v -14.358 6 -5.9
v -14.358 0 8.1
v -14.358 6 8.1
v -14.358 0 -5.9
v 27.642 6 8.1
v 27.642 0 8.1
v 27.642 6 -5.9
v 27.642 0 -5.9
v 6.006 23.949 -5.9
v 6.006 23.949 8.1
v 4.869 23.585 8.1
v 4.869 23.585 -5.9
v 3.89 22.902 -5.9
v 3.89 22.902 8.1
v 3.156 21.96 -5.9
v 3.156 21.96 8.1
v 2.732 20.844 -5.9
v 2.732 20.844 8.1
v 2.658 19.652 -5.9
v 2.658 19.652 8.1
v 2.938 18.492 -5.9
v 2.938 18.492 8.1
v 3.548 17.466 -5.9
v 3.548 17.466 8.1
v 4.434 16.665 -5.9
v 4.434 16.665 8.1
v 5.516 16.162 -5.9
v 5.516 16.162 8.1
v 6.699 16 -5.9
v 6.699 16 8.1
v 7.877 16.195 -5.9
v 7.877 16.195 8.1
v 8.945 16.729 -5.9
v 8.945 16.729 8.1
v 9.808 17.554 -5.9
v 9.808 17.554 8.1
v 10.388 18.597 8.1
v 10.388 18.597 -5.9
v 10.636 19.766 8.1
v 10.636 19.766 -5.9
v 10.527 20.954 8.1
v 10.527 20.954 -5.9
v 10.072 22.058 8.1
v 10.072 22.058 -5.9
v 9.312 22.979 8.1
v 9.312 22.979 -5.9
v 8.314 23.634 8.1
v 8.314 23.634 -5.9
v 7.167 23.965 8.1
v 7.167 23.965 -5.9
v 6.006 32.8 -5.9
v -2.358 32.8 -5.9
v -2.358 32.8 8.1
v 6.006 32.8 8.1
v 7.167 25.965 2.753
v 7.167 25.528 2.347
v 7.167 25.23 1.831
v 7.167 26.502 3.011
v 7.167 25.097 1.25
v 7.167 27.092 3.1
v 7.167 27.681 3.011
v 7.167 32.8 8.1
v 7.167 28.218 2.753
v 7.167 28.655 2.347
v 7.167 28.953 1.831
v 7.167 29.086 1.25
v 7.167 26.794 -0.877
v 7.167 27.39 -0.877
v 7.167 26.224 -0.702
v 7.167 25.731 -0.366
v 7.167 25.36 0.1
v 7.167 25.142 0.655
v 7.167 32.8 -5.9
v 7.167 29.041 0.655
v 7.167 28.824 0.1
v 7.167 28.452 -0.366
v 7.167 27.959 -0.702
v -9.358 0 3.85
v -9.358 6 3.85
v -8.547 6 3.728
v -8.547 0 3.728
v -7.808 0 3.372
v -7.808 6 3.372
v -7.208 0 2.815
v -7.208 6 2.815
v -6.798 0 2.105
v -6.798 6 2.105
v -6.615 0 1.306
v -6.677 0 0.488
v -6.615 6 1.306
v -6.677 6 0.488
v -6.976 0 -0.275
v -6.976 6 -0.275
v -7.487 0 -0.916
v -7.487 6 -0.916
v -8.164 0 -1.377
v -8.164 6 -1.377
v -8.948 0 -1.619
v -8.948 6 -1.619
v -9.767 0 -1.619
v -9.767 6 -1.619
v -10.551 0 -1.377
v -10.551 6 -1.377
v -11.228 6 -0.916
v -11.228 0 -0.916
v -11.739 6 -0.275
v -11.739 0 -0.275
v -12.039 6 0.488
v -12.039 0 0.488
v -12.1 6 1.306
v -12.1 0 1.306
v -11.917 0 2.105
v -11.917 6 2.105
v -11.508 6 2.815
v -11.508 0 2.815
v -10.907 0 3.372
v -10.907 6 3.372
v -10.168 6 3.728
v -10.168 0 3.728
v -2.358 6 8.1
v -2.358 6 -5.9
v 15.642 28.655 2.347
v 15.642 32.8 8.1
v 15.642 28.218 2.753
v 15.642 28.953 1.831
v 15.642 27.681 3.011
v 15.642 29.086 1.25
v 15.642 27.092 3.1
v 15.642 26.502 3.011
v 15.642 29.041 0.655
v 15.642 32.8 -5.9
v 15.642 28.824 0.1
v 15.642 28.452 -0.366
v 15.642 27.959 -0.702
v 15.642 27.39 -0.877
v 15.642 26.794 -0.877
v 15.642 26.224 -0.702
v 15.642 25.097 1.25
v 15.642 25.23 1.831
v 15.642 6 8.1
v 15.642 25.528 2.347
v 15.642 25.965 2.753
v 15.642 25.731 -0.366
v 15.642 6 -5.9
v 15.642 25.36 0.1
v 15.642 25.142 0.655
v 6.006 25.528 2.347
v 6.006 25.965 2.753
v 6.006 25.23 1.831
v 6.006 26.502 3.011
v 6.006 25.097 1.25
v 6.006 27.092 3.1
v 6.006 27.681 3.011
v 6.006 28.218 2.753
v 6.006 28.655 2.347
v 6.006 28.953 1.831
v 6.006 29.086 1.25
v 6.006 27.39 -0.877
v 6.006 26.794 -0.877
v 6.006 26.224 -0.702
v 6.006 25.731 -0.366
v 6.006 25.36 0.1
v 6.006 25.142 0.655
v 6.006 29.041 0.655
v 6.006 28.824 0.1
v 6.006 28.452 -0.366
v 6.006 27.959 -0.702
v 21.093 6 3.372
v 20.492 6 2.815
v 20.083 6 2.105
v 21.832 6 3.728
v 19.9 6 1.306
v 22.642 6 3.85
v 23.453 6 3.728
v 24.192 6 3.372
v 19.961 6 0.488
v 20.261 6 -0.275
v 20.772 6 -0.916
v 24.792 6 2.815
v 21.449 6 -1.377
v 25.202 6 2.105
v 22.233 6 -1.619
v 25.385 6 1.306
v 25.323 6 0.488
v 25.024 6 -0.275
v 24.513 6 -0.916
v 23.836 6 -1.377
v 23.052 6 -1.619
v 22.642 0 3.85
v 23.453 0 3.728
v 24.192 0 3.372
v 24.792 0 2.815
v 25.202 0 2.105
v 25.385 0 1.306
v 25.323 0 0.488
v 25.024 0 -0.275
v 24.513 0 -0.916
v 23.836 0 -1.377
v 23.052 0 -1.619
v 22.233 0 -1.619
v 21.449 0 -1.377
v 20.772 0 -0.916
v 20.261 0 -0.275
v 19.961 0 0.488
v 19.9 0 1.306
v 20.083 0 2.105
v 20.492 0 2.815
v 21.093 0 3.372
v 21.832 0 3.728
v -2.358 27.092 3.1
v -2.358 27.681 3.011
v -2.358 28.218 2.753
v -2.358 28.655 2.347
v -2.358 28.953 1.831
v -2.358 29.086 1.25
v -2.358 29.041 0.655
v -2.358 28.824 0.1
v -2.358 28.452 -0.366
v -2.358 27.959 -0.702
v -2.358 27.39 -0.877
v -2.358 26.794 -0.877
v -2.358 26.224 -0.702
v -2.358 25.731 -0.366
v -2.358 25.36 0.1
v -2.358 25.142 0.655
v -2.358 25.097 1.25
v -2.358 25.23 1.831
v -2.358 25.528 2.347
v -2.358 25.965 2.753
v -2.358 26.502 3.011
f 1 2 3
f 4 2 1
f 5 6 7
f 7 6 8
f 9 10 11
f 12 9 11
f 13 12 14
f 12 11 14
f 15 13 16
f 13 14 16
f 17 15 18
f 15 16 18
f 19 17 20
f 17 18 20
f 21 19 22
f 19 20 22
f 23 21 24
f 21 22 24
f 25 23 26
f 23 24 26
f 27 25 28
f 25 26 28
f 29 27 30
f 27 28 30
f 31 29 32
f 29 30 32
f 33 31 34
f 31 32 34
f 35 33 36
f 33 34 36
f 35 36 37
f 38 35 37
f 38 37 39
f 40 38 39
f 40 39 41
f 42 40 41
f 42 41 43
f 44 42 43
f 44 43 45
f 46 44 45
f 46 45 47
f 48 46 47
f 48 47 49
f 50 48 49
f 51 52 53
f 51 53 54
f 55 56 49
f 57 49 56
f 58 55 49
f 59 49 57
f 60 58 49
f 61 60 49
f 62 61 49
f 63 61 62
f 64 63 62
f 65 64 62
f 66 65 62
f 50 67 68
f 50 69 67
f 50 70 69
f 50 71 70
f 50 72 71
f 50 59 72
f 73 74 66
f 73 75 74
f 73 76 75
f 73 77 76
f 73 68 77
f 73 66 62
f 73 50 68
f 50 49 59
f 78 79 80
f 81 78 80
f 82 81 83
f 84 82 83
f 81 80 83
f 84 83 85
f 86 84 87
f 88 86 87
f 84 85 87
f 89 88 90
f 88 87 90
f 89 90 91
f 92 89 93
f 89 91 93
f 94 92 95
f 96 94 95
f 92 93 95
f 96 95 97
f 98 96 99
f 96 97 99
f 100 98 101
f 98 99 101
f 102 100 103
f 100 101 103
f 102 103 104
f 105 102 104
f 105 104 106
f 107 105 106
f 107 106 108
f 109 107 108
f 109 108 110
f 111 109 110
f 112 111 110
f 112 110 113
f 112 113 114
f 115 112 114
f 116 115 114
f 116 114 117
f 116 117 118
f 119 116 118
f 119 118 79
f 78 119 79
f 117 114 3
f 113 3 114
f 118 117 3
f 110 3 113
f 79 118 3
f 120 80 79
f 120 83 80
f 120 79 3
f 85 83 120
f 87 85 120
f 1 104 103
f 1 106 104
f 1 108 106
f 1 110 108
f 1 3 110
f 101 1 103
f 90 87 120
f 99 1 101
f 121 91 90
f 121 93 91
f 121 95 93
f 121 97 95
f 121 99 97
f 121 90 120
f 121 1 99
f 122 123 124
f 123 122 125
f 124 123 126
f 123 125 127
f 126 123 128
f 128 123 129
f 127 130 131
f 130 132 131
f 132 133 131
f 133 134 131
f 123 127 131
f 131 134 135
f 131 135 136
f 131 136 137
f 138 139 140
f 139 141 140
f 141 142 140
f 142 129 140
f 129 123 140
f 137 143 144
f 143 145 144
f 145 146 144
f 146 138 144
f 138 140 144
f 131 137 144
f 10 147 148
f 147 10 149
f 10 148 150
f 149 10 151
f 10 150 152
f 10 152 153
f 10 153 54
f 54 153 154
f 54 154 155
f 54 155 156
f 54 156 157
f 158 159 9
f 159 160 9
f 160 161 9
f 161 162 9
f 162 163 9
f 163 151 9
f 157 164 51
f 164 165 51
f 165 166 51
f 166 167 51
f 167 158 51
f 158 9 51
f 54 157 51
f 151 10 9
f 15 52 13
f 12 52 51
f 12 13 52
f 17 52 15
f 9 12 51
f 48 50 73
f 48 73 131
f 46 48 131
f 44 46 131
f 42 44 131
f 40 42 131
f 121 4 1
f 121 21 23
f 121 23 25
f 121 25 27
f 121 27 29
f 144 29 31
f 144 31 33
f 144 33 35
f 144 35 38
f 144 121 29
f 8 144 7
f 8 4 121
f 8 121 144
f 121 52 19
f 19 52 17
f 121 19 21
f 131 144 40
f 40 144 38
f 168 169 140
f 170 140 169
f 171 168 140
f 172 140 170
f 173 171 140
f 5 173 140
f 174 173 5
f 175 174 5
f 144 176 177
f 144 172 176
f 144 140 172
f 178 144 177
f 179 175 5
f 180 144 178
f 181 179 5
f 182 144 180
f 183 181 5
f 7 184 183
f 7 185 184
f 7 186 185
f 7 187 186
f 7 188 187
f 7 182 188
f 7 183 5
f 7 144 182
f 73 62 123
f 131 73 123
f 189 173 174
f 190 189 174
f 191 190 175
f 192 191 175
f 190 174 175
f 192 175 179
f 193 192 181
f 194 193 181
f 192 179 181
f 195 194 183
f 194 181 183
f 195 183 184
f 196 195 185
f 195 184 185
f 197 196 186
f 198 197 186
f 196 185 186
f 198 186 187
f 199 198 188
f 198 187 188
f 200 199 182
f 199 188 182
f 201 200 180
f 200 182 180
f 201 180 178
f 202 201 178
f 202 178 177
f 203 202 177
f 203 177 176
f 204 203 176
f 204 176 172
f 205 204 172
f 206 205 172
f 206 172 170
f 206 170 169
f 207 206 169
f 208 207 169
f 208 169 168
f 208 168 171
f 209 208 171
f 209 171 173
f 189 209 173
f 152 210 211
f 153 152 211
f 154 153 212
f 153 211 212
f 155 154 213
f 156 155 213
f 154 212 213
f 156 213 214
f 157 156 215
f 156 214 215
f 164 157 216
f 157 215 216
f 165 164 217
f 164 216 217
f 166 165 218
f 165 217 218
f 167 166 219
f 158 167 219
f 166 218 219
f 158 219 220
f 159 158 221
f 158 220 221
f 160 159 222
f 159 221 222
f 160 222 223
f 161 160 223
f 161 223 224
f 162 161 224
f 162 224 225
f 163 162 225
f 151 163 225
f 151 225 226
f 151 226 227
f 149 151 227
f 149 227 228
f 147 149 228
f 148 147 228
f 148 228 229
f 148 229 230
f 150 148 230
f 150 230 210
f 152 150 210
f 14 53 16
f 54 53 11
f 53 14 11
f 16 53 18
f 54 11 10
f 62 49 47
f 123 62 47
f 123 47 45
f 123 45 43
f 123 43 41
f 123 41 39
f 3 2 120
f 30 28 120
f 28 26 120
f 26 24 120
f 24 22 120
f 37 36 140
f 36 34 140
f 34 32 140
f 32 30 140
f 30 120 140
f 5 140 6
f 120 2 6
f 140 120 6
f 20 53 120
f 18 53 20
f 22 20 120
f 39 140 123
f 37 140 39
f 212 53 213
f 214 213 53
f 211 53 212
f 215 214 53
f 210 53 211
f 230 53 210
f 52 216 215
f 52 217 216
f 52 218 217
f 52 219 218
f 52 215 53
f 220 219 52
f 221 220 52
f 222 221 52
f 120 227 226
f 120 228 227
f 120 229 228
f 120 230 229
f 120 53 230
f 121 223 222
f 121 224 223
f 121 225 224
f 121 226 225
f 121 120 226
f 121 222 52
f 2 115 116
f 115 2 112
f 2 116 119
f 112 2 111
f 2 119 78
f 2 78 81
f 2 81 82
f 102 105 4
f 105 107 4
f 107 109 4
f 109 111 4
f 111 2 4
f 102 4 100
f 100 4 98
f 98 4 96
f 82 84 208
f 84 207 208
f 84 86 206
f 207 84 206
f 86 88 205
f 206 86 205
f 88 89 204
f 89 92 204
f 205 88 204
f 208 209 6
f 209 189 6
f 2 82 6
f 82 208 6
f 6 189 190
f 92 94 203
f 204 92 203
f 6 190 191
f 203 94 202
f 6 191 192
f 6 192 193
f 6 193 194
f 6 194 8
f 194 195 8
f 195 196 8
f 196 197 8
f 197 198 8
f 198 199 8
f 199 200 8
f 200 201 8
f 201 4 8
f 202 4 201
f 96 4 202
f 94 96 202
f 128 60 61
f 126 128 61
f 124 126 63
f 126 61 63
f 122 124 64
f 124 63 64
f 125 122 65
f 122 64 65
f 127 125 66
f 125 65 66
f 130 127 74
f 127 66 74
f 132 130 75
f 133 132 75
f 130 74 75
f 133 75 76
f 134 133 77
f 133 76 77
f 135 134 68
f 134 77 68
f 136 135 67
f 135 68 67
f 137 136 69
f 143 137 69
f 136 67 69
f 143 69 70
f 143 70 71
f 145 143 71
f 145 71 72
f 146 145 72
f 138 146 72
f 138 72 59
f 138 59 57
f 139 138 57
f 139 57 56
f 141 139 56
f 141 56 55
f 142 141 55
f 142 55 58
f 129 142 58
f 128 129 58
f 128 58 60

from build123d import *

# Parameters (mm, degrees)
SKETCH_1_W          = 42
SKETCH_1_H          = 14
EXTRUDE_1_DEPTH     = 6
SKETCH_2_R          = 2.75
CUT_EXTRUDE_1_DEPTH = 30.423076981
SKETCH_3_W          = 18
SKETCH_3_H          = 14
EXTRUDE_2_DEPTH     = 26.8
SKETCH_4_R          = 4
CUT_EXTRUDE_2_DEPTH = 46.121439209
SKETCH_5_W          = 1.161233153
SKETCH_5_H          = 8.851007199
CUT_EXTRUDE_3_DEPTH = 46.121439209
SKETCH_7_R          = 2
CUT_EXTRUDE_4_DEPTH = 46.182443302


with BuildPart() as part:
    # 草图1 → 凸台-拉伸1 (new body)
    with BuildSketch(Plane(origin=(0, 0, 0), x_dir=(1, 0, 0), z_dir=(0, 1, 0))):
        with Locations((6.642436149, -1.100196464)):
            Rectangle(SKETCH_1_W, SKETCH_1_H)
    extrude(amount=EXTRUDE_1_DEPTH)

    # 草图2 → 切除-拉伸1 (cut, through all)
    with BuildSketch(Plane(origin=(0, 6, 0), x_dir=(1, 0, 0), z_dir=(0, 1, 0))):
        with Locations(Location((-9.357563851, -1.100196464, 0), (0, 0, 270))):
            Circle(SKETCH_2_R)
        with Locations(Location((22.642436149, -1.100196464, 0), (0, 0, 270))):
            Circle(SKETCH_2_R)
    extrude(amount=-CUT_EXTRUDE_1_DEPTH, mode=Mode.SUBTRACT)

    # 草图3 → 凸台-拉伸2 (add)
    with BuildSketch(Plane(origin=(0, 6, 0), x_dir=(1, 0, 0), z_dir=(0, 1, 0))):
        with Locations((6.642436149, -1.100196464)):
            Rectangle(SKETCH_3_W, SKETCH_3_H)
    extrude(amount=EXTRUDE_2_DEPTH)

    # 草图4 → 切除-拉伸2 (cut, through all)
    with BuildSketch(Plane.XY.offset(8.100196464)):
        with Locations((6.642436149, 20)):
            Circle(SKETCH_4_R)
    extrude(amount=-CUT_EXTRUDE_2_DEPTH, mode=Mode.SUBTRACT)

    # 草图5 → 切除-拉伸3 (cut, through all)
    with BuildSketch(Plane(origin=(0, 0, -5.899803536), x_dir=(-1, 0, 0), z_dir=(0, 0, -1))):
        with Locations((-6.586298571, 28.374496401)):
            Rectangle(SKETCH_5_W, SKETCH_5_H)
    extrude(amount=-CUT_EXTRUDE_3_DEPTH, mode=Mode.SUBTRACT)

    # 草图7 → 切除-拉伸4 (cut, through all)
    with BuildSketch(Plane.ZY.offset(2.357563851)):
        with Locations((1.100196464, 27.091605966)):
            Circle(SKETCH_7_R)
    extrude(amount=-CUT_EXTRUDE_4_DEPTH, mode=Mode.SUBTRACT)


solid = part.part
